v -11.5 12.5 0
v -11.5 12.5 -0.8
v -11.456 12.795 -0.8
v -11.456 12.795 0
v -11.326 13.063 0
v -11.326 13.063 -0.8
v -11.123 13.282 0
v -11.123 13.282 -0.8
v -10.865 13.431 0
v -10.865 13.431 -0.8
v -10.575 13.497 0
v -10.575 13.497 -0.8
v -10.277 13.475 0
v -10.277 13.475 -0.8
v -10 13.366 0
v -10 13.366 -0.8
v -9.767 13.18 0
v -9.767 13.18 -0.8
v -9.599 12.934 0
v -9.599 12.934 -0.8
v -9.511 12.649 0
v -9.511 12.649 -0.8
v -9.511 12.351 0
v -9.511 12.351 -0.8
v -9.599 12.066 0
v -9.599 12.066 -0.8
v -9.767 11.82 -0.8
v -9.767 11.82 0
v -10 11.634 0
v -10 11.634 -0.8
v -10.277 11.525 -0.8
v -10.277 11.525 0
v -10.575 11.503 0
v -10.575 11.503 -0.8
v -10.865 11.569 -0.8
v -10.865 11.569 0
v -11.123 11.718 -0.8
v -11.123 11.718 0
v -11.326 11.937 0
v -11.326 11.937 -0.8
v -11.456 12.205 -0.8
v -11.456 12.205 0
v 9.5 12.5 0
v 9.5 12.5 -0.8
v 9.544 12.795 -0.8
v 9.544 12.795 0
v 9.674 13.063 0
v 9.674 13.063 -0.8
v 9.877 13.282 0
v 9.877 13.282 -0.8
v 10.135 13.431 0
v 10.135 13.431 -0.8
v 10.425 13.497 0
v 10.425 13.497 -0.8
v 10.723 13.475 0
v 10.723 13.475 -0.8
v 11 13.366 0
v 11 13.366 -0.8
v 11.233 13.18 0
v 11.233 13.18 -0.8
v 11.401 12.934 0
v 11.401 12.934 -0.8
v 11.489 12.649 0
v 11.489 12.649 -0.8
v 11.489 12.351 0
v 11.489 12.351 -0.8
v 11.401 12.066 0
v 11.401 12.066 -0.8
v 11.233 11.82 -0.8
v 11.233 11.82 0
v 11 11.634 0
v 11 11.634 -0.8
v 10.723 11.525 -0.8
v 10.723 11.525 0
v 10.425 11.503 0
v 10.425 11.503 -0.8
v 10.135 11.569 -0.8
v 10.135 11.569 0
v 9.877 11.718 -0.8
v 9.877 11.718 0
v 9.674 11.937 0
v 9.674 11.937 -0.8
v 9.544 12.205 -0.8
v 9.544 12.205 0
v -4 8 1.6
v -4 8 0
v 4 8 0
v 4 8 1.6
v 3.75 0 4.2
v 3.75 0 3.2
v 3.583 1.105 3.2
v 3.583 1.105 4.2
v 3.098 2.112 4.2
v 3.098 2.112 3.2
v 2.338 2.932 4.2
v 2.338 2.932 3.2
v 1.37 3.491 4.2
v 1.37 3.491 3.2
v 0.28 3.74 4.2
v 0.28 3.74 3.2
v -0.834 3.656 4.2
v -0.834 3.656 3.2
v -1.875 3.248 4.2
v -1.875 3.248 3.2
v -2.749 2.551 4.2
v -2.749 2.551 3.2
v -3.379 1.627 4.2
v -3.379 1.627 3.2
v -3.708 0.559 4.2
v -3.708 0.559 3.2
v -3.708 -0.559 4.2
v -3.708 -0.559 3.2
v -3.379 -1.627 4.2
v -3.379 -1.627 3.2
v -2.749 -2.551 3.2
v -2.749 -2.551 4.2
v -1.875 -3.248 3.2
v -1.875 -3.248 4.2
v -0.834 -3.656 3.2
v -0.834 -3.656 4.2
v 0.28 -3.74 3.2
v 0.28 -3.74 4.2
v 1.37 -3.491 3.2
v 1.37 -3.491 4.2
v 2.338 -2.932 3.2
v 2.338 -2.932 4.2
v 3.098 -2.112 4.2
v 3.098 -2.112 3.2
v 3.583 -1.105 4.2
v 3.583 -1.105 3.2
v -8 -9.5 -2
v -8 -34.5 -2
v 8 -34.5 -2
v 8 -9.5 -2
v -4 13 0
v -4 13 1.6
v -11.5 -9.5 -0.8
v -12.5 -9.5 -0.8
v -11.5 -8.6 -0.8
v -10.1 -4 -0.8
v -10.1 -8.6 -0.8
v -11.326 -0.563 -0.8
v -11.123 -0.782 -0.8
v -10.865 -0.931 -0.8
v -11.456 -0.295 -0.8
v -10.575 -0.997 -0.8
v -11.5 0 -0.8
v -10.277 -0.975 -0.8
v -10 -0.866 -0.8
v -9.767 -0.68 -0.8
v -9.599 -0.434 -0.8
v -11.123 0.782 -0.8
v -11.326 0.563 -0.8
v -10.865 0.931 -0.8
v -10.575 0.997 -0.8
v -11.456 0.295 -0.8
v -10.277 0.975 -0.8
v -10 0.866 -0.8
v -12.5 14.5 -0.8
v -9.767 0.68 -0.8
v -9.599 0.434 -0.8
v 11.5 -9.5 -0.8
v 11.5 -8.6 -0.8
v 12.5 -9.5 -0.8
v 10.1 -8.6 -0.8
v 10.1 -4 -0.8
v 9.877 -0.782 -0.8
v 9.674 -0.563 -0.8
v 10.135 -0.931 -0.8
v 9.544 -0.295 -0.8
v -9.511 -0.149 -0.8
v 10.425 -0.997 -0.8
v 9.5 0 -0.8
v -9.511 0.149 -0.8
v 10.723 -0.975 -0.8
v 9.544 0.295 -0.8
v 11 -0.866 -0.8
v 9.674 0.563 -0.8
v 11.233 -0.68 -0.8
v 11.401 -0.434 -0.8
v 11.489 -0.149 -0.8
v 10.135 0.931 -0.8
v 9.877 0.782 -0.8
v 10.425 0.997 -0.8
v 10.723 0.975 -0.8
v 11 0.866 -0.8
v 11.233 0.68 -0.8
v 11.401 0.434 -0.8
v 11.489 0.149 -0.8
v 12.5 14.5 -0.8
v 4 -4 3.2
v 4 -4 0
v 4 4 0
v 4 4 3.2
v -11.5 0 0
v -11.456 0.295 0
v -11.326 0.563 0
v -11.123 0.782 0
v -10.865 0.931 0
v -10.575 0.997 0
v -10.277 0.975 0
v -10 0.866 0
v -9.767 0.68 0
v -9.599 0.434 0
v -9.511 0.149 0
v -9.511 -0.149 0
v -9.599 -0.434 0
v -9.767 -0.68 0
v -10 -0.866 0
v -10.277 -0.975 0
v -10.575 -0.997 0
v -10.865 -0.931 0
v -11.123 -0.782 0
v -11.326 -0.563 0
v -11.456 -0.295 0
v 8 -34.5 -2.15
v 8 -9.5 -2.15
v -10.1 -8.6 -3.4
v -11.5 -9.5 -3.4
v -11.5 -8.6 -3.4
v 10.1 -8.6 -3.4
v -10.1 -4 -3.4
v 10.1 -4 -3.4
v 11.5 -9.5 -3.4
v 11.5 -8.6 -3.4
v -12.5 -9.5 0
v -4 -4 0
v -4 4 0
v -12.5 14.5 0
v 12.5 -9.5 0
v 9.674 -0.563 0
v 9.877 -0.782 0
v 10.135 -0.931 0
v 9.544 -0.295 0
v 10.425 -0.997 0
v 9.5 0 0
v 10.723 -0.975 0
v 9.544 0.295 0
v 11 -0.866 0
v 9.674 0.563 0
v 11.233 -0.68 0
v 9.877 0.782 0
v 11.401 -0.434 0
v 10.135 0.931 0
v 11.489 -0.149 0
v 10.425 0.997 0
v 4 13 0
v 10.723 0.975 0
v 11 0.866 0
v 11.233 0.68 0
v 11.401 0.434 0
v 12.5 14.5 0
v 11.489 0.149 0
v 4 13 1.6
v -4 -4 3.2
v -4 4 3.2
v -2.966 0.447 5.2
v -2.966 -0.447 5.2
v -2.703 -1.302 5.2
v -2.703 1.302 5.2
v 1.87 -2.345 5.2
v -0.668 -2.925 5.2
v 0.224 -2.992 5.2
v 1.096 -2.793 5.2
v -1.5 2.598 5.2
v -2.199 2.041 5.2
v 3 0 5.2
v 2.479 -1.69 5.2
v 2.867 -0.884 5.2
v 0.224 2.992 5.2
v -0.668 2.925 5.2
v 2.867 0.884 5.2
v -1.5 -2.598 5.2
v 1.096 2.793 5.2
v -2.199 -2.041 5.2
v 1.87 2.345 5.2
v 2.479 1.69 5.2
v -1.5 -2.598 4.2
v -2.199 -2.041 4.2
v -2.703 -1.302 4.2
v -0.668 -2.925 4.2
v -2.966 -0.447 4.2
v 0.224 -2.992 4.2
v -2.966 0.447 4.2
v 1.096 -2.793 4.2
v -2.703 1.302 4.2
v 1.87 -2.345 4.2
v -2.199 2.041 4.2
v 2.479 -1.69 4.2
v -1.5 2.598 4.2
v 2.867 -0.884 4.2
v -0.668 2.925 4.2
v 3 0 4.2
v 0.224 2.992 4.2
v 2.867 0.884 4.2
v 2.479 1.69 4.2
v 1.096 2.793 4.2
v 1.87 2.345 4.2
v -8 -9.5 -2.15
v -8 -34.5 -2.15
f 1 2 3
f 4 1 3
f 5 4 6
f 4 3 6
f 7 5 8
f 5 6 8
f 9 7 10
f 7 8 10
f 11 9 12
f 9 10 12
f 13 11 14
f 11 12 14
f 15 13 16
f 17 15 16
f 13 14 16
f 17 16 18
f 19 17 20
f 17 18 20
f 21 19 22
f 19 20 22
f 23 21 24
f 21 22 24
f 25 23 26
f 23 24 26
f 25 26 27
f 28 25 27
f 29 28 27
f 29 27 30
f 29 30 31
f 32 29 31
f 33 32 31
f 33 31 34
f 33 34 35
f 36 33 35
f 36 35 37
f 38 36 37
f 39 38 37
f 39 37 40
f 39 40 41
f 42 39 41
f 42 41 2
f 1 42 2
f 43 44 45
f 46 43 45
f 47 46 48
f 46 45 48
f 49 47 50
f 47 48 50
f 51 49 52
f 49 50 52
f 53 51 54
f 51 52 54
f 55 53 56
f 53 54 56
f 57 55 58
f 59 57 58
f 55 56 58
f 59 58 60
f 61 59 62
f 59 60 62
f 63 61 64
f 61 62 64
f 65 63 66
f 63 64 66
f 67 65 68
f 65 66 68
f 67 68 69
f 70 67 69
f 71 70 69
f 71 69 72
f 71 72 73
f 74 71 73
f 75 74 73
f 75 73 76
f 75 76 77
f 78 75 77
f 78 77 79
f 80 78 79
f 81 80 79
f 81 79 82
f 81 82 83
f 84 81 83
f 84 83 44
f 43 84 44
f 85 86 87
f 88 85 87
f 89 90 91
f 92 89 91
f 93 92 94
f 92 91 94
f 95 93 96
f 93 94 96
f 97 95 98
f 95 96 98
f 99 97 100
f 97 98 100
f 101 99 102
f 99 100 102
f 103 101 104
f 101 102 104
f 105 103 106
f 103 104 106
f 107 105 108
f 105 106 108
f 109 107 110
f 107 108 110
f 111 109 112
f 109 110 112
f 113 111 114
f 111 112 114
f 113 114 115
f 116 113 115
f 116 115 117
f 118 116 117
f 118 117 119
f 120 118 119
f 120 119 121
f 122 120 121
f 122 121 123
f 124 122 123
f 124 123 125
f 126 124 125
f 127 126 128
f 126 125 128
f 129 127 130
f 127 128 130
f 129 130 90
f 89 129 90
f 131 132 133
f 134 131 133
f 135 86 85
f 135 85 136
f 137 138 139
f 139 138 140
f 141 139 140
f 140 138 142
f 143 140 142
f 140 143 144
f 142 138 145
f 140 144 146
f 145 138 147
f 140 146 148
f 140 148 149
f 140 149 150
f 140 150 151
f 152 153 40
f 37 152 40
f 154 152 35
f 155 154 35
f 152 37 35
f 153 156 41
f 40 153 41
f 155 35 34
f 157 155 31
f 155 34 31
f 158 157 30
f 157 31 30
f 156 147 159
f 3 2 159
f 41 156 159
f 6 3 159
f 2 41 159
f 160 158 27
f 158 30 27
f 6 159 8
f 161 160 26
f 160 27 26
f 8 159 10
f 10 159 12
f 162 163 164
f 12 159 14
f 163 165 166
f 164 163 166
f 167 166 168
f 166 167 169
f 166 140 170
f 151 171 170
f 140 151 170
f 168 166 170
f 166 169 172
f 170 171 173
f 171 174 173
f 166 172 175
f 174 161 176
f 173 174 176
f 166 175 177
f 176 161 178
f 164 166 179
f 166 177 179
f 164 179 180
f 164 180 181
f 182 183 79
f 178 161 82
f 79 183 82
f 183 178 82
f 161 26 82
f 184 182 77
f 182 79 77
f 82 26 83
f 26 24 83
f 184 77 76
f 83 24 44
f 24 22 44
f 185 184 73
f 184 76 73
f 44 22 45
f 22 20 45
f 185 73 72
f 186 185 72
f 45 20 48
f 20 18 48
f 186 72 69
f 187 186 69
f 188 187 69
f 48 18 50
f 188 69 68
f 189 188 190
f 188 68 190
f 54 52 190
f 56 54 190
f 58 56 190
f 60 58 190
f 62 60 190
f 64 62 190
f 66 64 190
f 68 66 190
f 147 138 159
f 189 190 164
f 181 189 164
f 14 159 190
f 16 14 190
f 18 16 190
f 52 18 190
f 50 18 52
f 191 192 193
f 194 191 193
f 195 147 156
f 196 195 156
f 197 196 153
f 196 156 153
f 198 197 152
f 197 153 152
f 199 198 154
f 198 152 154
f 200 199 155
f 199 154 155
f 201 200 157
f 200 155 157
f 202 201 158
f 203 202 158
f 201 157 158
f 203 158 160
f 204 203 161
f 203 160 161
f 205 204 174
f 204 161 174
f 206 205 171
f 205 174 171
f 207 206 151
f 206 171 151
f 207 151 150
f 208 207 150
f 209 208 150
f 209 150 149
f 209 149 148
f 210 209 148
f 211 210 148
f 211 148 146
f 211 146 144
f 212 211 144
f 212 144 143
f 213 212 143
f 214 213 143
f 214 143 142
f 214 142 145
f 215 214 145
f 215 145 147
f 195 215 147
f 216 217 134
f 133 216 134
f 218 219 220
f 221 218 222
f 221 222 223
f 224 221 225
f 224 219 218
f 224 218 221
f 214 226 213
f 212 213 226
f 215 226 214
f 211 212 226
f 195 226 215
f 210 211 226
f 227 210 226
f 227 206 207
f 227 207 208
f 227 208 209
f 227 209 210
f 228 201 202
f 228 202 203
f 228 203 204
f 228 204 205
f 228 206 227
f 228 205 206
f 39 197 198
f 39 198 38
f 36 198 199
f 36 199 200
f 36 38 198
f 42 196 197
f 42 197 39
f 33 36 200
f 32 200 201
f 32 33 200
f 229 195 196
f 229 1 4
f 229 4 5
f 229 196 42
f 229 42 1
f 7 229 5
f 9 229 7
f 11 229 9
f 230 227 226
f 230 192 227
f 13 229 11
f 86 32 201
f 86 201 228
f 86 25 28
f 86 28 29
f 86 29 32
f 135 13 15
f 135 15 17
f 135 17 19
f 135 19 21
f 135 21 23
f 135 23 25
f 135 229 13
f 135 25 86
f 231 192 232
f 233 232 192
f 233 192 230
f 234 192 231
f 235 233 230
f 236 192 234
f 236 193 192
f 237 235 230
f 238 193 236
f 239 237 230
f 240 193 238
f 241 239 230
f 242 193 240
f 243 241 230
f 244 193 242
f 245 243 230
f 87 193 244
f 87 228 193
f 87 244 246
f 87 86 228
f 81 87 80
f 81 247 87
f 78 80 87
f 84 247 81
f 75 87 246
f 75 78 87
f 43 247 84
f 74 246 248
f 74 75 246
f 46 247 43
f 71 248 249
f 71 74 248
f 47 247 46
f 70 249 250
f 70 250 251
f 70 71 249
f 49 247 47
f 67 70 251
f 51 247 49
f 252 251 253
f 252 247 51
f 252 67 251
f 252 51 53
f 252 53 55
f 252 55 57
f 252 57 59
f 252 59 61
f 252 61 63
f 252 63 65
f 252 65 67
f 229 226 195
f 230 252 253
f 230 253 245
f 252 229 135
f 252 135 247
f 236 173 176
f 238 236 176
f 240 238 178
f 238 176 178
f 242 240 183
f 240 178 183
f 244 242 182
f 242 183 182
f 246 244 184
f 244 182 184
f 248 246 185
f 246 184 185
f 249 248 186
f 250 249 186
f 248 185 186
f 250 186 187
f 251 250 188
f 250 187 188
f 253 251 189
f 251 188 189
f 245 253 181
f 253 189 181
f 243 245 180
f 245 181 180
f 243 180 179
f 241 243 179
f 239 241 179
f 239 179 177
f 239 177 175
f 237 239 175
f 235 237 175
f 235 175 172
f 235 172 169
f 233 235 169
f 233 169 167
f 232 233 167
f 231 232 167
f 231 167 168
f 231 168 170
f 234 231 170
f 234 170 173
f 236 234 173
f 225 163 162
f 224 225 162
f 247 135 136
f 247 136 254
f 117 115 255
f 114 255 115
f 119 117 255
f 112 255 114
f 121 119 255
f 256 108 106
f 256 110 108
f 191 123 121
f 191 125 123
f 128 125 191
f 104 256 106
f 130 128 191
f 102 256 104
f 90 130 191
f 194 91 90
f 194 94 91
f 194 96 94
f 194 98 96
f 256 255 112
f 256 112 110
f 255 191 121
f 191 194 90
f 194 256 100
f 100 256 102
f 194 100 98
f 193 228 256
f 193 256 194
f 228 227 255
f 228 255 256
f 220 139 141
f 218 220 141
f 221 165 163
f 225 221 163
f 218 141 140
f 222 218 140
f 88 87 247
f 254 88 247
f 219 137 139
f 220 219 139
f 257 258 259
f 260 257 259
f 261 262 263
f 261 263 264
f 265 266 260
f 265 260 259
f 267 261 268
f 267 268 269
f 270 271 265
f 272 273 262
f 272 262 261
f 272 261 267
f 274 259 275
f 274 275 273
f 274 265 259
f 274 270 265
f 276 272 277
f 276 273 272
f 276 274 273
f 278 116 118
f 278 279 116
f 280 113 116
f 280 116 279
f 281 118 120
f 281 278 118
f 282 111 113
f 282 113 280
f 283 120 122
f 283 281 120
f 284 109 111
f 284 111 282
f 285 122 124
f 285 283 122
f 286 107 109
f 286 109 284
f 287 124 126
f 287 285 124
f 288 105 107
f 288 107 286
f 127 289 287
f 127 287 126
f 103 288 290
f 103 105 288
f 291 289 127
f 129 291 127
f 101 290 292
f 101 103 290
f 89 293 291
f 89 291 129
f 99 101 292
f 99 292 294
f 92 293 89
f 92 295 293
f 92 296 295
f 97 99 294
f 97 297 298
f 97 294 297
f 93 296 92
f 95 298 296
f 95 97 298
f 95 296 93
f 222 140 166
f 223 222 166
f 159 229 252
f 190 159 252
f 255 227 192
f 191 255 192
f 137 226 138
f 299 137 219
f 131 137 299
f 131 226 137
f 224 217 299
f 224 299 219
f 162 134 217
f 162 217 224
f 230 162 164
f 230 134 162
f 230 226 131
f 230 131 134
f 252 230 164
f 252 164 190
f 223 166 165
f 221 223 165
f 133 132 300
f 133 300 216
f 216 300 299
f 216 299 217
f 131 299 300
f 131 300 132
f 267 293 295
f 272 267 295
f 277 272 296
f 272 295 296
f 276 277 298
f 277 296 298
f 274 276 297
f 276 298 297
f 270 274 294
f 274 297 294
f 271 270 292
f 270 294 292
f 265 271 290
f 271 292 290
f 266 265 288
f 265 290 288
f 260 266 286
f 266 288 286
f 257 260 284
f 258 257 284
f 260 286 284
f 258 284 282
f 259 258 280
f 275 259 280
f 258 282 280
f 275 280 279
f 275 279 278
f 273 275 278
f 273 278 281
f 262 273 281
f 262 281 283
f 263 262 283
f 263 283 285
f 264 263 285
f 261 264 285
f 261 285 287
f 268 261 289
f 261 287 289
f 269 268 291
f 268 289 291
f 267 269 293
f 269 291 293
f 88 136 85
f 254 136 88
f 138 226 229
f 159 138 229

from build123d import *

# Parameters (mm, degrees)
F0_W      = 25
F0_H      = 24
F1_DEPTH  = 0.8
F2_W      = 8
F2_H      = 8
F3_DEPTH  = 3.2
F4_R      = 3.75
F5_DEPTH  = 1
F6_R      = 3
F7_DEPTH  = 1
F9_D      = 2
F10_W     = 8
F10_H     = 5
F11_DEPTH = 1.6
F13_DEPTH = 2.6
F14_W     = 16
F14_H     = 0.15
F15_DEPTH = 25


with BuildPart() as f1:
    # F0 (on Top) → F1 (new body)
    with BuildSketch(Plane.XY):
        with Locations((0, 2.5)):
            Rectangle(F0_W, F0_H)
    extrude(amount=-F1_DEPTH)

    # F2 (on face) → F3 (join)
    with BuildSketch(Plane.XY):
        Rectangle(F2_W, F2_H)
    extrude(amount=F3_DEPTH)

    # F4 (on face) → F5 (join)
    with BuildSketch(Plane.XY.offset(3.2)):
        Circle(F4_R)
    extrude(amount=F5_DEPTH)

    # F6 (on face) → F7 (join)
    with BuildSketch(Plane.XY.offset(4.2)):
        Circle(F6_R)
    extrude(amount=F7_DEPTH)

    # F9 (through all)
    with Locations(Plane.XY):
        with Locations((-10.5, 12.5), (10.5, 12.5), (10.5, 0), (-10.5, 0)):
            Hole(F9_D / 2)

    # F10 (on face) → F11 (join)
    with BuildSketch(Plane.XY):
        with Locations((0, 10.5)):
            Rectangle(F10_W, F10_H)
    extrude(amount=F11_DEPTH)

    # F12 (on face) → F13 (join)
    with BuildSketch(Plane(origin=(0, 0, -0.8), x_dir=(1, 0, 0), z_dir=(0, 0, -1))):
        Polygon((11.5, 9.5), (-11.5, 9.5), (-11.5, 8.6), (-10.1, 8.6), (-10.1, 4), (10.1, 4), (10.1, 8.6), (11.5, 8.6), align=None)
    extrude(amount=F13_DEPTH)

    # F14 (on face) → F15 (join)
    with BuildSketch(Plane.XZ.offset(9.5)):
        with Locations((0, -2.075)):
            Rectangle(F14_W, F14_H)
    extrude(amount=F15_DEPTH)


solid = f1.part
